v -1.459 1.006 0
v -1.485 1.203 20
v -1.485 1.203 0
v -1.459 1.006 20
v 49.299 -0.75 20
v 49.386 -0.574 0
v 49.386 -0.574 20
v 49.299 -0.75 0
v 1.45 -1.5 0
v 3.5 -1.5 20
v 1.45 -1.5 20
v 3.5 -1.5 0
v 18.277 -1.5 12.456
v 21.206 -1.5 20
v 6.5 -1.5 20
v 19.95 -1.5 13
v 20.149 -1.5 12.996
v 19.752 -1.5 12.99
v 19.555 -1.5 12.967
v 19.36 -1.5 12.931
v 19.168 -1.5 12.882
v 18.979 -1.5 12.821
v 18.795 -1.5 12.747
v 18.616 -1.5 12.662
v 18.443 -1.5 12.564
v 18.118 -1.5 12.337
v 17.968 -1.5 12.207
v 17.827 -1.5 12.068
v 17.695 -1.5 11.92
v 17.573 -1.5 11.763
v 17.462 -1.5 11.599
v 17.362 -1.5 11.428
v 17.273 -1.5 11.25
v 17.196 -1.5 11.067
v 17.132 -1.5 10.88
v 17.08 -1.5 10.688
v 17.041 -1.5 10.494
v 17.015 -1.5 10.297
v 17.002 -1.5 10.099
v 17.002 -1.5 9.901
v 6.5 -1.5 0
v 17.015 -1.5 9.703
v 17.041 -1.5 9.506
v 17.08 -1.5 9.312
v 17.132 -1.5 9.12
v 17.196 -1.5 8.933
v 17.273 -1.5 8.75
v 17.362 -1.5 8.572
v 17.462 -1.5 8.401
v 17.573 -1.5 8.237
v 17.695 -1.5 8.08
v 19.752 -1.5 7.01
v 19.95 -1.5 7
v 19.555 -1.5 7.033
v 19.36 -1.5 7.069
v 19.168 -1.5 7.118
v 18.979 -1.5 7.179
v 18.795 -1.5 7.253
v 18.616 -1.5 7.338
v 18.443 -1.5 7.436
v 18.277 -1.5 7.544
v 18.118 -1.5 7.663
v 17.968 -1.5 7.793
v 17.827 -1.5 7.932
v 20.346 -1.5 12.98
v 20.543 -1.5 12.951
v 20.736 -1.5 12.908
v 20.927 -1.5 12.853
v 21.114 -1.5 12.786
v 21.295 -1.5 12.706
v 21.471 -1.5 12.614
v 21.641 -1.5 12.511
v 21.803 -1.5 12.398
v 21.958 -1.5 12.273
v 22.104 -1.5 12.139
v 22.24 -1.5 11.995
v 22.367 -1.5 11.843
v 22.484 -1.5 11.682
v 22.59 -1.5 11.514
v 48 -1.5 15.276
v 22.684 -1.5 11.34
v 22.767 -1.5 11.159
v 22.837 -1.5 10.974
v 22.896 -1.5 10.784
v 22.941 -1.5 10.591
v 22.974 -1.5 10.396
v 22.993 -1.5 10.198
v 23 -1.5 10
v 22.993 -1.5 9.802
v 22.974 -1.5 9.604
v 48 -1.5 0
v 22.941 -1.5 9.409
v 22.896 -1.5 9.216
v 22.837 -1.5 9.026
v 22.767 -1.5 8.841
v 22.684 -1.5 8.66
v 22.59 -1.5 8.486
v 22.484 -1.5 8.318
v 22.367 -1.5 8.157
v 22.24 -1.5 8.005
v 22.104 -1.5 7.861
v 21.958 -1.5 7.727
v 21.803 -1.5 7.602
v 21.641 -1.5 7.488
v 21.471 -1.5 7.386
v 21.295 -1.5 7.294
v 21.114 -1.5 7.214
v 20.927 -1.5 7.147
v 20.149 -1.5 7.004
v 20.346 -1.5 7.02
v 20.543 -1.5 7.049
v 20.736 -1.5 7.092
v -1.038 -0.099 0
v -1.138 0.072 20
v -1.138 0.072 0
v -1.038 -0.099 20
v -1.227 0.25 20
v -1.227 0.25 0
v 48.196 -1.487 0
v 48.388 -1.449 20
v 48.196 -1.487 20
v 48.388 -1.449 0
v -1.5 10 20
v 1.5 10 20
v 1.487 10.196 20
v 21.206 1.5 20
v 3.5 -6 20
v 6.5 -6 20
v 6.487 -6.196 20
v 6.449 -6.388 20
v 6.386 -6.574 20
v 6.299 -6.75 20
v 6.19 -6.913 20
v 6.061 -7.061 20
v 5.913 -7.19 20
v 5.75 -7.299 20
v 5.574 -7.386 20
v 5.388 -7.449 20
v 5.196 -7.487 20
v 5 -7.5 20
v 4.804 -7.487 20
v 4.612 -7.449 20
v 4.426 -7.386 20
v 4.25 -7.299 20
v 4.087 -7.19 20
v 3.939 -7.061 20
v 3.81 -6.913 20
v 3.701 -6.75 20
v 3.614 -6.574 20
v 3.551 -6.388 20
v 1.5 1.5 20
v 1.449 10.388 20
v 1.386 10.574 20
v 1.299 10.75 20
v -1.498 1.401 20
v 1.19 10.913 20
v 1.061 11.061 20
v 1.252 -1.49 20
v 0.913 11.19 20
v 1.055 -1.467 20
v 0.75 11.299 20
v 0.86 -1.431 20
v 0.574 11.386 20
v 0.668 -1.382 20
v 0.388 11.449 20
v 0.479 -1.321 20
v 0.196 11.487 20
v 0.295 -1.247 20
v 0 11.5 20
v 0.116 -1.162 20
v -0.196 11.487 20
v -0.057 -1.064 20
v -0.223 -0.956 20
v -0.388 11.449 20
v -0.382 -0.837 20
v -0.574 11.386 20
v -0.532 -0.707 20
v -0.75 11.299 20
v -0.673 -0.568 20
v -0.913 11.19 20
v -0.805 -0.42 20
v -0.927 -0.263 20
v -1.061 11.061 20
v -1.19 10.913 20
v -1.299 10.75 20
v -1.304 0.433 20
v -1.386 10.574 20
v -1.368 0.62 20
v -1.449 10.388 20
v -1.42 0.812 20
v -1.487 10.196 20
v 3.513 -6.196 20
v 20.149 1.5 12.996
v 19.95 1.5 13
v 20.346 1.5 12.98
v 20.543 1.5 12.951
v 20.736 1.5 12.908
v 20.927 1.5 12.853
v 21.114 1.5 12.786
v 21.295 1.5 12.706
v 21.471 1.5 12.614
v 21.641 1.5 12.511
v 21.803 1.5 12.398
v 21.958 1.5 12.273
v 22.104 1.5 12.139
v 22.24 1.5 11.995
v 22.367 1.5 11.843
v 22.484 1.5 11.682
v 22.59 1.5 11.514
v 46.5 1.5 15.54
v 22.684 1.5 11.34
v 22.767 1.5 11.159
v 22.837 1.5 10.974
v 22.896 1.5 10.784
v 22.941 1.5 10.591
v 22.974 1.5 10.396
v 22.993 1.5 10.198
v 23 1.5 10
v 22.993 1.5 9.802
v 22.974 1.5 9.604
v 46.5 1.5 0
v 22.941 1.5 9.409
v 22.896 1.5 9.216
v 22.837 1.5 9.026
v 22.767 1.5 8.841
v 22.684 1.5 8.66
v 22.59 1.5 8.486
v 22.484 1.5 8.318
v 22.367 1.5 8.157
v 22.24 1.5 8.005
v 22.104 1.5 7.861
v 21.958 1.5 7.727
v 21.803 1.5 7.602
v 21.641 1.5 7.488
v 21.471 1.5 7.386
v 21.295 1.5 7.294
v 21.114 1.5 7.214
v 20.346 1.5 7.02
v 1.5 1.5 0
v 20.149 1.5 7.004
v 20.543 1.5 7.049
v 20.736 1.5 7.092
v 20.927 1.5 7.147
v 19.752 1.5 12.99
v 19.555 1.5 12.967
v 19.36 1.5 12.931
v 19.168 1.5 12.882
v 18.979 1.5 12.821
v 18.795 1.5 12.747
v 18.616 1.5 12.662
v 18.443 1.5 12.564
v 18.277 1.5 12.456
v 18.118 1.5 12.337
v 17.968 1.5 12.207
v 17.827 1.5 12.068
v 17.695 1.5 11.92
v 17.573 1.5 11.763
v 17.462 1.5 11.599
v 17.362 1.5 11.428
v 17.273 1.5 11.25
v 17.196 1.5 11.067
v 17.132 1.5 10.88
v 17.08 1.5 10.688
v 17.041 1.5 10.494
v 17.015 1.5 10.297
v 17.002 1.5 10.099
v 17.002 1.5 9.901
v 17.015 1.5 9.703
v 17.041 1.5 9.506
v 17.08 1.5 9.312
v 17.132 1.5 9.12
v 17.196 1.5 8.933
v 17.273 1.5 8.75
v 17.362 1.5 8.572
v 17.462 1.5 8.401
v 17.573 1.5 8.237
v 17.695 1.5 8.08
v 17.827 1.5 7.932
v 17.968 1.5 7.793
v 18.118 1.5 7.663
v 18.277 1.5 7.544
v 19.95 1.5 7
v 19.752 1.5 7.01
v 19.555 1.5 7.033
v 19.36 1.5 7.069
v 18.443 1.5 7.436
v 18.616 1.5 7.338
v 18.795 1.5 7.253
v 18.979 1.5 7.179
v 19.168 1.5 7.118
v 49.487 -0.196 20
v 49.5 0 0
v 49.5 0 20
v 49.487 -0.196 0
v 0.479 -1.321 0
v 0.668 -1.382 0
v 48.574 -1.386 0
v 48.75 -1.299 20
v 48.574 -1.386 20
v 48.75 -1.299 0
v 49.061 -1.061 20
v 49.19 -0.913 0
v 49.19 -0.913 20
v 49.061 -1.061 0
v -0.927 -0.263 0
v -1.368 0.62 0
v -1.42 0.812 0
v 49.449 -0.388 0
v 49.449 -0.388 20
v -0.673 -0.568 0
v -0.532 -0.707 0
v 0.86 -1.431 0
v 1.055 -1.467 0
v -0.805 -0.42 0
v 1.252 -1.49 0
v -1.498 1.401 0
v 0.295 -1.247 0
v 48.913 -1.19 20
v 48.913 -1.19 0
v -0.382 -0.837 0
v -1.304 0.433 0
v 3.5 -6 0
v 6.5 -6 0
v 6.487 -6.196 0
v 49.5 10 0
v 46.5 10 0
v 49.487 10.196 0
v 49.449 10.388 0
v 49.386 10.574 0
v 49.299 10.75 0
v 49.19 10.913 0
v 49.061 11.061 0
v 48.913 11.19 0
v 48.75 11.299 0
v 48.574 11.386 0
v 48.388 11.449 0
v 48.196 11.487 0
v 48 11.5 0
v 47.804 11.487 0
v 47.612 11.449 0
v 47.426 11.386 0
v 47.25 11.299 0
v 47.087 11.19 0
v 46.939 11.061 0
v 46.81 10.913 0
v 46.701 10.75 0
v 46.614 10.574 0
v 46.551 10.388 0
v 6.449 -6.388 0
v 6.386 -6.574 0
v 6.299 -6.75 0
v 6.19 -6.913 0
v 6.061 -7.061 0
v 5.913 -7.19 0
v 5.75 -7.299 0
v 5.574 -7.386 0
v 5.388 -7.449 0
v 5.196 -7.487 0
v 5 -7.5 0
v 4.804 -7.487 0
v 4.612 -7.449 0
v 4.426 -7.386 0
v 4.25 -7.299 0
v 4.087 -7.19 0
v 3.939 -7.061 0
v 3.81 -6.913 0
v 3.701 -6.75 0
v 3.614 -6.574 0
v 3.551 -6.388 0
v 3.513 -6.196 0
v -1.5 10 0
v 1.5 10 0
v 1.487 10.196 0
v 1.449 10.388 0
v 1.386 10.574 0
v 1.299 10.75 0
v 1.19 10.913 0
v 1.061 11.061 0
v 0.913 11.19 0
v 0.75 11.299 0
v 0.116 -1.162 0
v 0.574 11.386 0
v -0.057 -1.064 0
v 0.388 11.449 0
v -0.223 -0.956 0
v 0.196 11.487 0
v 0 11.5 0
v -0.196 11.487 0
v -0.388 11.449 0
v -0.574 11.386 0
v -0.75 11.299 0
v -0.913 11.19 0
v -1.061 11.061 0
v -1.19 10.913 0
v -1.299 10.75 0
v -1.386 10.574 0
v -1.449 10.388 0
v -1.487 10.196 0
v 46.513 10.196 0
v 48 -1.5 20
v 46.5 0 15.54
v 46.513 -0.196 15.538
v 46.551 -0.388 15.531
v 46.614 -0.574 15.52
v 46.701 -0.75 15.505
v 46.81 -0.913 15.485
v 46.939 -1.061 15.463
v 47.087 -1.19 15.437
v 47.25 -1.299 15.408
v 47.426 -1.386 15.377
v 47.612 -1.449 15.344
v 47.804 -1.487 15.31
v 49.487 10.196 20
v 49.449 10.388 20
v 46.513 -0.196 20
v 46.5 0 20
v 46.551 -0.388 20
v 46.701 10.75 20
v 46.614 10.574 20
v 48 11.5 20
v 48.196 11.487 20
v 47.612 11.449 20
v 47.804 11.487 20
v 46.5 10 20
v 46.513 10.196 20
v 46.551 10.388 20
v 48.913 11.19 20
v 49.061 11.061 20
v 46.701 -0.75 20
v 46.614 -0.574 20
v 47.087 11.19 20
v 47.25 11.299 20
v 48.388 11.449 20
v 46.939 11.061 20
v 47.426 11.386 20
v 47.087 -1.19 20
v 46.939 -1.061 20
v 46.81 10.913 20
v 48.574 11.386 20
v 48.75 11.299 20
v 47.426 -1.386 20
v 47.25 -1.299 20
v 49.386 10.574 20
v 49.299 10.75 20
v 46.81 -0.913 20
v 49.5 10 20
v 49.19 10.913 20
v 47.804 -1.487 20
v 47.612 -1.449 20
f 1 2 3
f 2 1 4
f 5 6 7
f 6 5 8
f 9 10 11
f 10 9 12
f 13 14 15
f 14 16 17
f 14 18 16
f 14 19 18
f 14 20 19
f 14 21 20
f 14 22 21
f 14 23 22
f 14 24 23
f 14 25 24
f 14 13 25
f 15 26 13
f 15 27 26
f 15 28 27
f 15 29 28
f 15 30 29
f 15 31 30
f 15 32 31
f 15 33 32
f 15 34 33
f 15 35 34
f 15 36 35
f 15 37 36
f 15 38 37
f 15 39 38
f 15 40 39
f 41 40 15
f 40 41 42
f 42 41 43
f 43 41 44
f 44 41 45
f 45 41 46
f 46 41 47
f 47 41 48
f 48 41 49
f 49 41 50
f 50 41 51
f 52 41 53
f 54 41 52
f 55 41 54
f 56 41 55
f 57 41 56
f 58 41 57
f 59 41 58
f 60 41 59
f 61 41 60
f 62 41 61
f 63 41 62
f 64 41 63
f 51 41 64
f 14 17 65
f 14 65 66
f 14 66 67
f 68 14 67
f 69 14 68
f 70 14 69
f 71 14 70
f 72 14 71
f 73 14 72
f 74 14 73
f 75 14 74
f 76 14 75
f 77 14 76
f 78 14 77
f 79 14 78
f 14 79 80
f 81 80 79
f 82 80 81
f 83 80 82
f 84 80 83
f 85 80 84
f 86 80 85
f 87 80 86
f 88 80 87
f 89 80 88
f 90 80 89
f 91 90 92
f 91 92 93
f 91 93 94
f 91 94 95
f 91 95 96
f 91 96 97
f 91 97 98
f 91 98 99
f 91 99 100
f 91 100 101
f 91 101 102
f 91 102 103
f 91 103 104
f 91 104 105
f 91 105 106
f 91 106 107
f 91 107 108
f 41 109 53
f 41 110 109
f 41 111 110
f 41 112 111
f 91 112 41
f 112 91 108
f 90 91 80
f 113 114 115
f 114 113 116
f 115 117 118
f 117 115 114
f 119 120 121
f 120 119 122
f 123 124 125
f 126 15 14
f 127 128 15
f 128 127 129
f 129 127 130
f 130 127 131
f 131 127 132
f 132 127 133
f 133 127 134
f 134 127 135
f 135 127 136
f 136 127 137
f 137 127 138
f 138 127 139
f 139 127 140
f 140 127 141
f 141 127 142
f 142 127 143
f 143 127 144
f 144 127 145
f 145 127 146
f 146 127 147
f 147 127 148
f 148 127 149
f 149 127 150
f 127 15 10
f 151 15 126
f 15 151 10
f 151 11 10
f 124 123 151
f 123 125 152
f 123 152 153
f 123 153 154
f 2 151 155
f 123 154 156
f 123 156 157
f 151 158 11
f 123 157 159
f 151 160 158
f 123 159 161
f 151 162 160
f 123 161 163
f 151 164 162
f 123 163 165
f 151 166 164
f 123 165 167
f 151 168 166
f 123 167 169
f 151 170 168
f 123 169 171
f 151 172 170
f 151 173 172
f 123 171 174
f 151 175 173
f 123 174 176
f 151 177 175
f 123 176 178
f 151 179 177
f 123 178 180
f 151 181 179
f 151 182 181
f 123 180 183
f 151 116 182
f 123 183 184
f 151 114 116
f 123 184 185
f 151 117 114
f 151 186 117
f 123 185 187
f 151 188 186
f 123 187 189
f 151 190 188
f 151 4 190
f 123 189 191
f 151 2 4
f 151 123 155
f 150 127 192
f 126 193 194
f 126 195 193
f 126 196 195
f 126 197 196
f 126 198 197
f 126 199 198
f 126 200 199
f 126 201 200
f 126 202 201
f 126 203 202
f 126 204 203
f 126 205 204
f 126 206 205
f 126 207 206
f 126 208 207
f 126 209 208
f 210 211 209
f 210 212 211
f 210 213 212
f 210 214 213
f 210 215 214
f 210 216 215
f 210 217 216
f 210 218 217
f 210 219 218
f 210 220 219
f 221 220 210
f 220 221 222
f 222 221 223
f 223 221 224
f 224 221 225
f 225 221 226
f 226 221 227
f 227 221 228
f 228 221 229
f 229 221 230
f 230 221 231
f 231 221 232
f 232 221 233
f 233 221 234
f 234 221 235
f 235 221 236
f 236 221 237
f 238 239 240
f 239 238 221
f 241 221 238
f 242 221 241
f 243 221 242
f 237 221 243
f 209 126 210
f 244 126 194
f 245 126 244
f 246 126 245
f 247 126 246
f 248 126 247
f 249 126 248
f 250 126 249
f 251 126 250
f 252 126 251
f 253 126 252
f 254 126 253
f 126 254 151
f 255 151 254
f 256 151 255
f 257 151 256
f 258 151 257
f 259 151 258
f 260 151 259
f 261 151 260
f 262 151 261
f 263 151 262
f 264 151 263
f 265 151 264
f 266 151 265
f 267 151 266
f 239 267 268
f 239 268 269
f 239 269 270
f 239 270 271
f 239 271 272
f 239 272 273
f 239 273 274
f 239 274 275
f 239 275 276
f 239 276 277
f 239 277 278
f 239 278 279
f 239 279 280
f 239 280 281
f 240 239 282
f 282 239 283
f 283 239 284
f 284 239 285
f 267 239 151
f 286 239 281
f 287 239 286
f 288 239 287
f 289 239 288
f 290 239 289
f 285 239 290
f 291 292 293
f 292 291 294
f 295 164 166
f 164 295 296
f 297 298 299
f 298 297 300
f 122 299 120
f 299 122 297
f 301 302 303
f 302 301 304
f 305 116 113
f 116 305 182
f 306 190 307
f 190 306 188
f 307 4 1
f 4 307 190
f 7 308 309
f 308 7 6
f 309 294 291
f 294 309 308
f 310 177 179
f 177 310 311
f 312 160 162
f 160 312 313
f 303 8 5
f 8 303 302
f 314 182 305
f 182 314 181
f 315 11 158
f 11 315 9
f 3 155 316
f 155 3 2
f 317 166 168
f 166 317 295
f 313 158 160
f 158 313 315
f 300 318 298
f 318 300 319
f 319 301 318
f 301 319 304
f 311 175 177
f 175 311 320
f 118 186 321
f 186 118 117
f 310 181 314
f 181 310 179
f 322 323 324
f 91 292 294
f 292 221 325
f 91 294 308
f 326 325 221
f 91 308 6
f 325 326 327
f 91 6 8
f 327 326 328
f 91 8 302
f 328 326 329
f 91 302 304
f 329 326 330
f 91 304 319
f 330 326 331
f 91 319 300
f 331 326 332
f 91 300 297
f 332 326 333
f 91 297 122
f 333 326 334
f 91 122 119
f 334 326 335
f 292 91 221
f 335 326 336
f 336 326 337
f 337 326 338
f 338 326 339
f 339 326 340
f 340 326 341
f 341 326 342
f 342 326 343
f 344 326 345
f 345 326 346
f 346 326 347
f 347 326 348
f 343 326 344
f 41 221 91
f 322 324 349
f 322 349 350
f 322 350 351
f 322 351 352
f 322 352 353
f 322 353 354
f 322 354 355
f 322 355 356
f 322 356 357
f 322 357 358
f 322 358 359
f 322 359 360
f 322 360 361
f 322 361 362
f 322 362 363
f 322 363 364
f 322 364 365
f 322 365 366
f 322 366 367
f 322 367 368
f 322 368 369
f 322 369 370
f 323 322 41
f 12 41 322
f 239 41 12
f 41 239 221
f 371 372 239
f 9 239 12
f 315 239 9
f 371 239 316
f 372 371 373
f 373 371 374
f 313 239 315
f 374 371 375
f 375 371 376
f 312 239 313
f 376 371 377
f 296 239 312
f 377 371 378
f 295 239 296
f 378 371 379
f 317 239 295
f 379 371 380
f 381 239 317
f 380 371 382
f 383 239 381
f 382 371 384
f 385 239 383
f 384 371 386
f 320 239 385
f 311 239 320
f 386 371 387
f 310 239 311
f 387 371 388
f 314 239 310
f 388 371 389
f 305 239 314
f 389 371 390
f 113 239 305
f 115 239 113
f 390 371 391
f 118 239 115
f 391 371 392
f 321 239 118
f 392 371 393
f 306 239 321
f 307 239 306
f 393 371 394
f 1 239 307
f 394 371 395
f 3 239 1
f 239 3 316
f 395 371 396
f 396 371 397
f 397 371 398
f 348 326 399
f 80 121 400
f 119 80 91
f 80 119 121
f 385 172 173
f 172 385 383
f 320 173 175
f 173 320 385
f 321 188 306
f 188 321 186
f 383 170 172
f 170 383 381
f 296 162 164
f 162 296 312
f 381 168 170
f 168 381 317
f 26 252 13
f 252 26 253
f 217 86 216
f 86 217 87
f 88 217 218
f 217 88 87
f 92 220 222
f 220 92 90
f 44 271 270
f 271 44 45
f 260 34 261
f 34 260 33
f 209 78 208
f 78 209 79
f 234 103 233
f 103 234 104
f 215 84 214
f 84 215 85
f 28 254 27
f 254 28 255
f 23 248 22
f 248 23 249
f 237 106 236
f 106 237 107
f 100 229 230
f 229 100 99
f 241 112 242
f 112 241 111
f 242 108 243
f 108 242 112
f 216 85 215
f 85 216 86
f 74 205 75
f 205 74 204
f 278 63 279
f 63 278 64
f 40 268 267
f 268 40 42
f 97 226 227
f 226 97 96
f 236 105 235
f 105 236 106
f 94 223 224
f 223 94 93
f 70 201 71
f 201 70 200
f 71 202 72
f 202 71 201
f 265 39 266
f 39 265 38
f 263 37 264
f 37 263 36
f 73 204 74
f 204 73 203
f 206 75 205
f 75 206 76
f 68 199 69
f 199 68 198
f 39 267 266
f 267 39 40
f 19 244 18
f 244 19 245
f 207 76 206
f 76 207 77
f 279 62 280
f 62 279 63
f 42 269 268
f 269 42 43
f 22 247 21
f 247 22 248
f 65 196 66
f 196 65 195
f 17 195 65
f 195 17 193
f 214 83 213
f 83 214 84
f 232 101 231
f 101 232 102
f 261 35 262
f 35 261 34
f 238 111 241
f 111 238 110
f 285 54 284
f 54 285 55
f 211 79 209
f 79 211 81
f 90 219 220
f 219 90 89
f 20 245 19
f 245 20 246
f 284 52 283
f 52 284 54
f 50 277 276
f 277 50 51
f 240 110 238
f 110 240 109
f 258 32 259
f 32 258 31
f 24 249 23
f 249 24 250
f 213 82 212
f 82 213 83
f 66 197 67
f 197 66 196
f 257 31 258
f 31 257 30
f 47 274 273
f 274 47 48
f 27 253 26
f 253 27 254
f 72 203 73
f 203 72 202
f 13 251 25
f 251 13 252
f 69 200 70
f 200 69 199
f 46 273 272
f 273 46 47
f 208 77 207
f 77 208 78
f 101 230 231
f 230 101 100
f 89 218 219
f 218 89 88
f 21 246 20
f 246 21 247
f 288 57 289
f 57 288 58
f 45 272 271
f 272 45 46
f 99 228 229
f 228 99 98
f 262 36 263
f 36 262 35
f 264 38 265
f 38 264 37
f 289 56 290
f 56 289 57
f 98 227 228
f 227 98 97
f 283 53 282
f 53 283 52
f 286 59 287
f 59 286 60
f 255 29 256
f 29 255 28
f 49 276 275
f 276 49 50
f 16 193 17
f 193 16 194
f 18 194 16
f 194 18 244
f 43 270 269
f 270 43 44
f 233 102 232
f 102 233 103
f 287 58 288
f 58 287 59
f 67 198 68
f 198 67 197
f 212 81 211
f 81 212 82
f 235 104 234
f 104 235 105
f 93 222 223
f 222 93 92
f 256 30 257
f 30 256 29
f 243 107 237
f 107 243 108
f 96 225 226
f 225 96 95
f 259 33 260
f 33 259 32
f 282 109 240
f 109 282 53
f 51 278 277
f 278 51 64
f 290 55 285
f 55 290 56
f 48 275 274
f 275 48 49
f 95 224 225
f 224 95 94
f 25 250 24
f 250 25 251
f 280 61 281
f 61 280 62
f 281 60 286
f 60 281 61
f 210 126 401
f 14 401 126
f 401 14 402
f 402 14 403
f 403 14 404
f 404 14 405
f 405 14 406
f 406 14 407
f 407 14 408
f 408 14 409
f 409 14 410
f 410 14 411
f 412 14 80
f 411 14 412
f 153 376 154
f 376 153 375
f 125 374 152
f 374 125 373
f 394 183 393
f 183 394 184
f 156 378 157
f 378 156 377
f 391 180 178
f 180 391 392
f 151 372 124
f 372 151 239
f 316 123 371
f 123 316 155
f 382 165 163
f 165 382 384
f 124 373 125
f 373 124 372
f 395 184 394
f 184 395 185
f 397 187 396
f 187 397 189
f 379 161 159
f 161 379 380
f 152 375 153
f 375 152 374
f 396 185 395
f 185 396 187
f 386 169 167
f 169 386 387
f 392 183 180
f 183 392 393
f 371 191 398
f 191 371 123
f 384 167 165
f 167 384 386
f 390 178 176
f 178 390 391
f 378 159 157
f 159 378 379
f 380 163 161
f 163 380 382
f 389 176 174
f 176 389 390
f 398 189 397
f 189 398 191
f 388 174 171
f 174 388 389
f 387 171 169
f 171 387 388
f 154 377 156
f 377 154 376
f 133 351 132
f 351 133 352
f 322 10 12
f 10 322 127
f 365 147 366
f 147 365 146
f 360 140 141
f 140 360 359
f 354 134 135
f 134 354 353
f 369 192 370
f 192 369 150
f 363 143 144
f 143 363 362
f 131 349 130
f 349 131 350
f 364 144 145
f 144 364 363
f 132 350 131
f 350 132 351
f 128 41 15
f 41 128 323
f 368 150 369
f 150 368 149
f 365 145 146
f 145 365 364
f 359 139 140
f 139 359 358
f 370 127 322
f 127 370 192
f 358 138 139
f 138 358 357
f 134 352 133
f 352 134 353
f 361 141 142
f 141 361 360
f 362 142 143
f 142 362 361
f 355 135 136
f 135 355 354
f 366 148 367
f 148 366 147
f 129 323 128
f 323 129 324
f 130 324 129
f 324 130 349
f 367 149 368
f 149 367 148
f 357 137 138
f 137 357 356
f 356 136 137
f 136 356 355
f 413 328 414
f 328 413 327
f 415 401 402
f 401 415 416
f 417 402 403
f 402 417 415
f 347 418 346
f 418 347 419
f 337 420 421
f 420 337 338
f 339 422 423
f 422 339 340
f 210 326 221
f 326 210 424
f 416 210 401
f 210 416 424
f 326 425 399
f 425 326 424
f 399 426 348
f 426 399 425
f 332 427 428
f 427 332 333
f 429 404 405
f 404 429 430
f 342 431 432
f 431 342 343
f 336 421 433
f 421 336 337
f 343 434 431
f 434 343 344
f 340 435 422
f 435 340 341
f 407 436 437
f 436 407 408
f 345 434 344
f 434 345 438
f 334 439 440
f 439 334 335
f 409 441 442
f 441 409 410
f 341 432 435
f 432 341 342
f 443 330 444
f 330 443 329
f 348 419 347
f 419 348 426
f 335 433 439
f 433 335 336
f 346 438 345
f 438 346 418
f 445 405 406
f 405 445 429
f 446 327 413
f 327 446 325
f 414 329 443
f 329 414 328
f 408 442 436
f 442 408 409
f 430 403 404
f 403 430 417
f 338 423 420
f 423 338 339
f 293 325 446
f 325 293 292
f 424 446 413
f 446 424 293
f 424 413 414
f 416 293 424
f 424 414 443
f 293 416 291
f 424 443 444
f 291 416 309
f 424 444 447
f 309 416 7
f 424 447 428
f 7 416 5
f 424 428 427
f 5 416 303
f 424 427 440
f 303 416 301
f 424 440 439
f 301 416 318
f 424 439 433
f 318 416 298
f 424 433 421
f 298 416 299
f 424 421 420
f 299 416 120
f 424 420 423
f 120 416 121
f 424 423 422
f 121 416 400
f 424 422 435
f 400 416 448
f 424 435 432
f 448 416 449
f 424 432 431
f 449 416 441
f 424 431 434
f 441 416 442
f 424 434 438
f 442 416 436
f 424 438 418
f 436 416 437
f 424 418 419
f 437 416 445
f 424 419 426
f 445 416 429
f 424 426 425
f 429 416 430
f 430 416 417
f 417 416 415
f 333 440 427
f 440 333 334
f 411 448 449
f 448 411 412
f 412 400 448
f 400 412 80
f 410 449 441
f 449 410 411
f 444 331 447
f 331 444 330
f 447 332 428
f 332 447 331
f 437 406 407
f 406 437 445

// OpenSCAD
//Settings.
width = 20;
length = 45;
thickness = 3;
back_hook_length = 10;
down_hook_length = 6;
front_hook_length = 10;
steel_thickness = 2;
$fs = 0.2;
$fa = 1;

module corner() {
	cylinder(r = thickness / 2, h=width);
}
module spaced_corner() {
	intersection() {
		translate([thickness / 2, thickness / 2, 0]) {
			cylinder(r = thickness, h=width);
		}
		translate([-thickness / 2, -thickness / 2, 0]) {
			cube([thickness, thickness, width]);
		}
	}
}

hull() {
	spaced_corner();
	translate([0, back_hook_length, 0]) {
		corner();
	}
}
difference(){
hull() {
	spaced_corner();
	translate([length + thickness, 0, 0]) {
		corner();
	}
}
translate([20, 0, 10]) rotate(90, [1, 0, 0]) cylinder(h=15, r1=3, r2=3, center=true);
translate([50, 0, 20]) rotate(10, [0, 1, 0]) cube(size = [60,40,10], center = true);
}
translate([thickness + steel_thickness, 0, 0]) {
	hull() {
		corner();
		translate([0, -down_hook_length, 0]) {
			corner();
		}
	}
}
translate([length + thickness, 0, 0]) {
	hull() {
		corner();
		translate([0, front_hook_length, 0]) {
			corner();
		}
	}
}
